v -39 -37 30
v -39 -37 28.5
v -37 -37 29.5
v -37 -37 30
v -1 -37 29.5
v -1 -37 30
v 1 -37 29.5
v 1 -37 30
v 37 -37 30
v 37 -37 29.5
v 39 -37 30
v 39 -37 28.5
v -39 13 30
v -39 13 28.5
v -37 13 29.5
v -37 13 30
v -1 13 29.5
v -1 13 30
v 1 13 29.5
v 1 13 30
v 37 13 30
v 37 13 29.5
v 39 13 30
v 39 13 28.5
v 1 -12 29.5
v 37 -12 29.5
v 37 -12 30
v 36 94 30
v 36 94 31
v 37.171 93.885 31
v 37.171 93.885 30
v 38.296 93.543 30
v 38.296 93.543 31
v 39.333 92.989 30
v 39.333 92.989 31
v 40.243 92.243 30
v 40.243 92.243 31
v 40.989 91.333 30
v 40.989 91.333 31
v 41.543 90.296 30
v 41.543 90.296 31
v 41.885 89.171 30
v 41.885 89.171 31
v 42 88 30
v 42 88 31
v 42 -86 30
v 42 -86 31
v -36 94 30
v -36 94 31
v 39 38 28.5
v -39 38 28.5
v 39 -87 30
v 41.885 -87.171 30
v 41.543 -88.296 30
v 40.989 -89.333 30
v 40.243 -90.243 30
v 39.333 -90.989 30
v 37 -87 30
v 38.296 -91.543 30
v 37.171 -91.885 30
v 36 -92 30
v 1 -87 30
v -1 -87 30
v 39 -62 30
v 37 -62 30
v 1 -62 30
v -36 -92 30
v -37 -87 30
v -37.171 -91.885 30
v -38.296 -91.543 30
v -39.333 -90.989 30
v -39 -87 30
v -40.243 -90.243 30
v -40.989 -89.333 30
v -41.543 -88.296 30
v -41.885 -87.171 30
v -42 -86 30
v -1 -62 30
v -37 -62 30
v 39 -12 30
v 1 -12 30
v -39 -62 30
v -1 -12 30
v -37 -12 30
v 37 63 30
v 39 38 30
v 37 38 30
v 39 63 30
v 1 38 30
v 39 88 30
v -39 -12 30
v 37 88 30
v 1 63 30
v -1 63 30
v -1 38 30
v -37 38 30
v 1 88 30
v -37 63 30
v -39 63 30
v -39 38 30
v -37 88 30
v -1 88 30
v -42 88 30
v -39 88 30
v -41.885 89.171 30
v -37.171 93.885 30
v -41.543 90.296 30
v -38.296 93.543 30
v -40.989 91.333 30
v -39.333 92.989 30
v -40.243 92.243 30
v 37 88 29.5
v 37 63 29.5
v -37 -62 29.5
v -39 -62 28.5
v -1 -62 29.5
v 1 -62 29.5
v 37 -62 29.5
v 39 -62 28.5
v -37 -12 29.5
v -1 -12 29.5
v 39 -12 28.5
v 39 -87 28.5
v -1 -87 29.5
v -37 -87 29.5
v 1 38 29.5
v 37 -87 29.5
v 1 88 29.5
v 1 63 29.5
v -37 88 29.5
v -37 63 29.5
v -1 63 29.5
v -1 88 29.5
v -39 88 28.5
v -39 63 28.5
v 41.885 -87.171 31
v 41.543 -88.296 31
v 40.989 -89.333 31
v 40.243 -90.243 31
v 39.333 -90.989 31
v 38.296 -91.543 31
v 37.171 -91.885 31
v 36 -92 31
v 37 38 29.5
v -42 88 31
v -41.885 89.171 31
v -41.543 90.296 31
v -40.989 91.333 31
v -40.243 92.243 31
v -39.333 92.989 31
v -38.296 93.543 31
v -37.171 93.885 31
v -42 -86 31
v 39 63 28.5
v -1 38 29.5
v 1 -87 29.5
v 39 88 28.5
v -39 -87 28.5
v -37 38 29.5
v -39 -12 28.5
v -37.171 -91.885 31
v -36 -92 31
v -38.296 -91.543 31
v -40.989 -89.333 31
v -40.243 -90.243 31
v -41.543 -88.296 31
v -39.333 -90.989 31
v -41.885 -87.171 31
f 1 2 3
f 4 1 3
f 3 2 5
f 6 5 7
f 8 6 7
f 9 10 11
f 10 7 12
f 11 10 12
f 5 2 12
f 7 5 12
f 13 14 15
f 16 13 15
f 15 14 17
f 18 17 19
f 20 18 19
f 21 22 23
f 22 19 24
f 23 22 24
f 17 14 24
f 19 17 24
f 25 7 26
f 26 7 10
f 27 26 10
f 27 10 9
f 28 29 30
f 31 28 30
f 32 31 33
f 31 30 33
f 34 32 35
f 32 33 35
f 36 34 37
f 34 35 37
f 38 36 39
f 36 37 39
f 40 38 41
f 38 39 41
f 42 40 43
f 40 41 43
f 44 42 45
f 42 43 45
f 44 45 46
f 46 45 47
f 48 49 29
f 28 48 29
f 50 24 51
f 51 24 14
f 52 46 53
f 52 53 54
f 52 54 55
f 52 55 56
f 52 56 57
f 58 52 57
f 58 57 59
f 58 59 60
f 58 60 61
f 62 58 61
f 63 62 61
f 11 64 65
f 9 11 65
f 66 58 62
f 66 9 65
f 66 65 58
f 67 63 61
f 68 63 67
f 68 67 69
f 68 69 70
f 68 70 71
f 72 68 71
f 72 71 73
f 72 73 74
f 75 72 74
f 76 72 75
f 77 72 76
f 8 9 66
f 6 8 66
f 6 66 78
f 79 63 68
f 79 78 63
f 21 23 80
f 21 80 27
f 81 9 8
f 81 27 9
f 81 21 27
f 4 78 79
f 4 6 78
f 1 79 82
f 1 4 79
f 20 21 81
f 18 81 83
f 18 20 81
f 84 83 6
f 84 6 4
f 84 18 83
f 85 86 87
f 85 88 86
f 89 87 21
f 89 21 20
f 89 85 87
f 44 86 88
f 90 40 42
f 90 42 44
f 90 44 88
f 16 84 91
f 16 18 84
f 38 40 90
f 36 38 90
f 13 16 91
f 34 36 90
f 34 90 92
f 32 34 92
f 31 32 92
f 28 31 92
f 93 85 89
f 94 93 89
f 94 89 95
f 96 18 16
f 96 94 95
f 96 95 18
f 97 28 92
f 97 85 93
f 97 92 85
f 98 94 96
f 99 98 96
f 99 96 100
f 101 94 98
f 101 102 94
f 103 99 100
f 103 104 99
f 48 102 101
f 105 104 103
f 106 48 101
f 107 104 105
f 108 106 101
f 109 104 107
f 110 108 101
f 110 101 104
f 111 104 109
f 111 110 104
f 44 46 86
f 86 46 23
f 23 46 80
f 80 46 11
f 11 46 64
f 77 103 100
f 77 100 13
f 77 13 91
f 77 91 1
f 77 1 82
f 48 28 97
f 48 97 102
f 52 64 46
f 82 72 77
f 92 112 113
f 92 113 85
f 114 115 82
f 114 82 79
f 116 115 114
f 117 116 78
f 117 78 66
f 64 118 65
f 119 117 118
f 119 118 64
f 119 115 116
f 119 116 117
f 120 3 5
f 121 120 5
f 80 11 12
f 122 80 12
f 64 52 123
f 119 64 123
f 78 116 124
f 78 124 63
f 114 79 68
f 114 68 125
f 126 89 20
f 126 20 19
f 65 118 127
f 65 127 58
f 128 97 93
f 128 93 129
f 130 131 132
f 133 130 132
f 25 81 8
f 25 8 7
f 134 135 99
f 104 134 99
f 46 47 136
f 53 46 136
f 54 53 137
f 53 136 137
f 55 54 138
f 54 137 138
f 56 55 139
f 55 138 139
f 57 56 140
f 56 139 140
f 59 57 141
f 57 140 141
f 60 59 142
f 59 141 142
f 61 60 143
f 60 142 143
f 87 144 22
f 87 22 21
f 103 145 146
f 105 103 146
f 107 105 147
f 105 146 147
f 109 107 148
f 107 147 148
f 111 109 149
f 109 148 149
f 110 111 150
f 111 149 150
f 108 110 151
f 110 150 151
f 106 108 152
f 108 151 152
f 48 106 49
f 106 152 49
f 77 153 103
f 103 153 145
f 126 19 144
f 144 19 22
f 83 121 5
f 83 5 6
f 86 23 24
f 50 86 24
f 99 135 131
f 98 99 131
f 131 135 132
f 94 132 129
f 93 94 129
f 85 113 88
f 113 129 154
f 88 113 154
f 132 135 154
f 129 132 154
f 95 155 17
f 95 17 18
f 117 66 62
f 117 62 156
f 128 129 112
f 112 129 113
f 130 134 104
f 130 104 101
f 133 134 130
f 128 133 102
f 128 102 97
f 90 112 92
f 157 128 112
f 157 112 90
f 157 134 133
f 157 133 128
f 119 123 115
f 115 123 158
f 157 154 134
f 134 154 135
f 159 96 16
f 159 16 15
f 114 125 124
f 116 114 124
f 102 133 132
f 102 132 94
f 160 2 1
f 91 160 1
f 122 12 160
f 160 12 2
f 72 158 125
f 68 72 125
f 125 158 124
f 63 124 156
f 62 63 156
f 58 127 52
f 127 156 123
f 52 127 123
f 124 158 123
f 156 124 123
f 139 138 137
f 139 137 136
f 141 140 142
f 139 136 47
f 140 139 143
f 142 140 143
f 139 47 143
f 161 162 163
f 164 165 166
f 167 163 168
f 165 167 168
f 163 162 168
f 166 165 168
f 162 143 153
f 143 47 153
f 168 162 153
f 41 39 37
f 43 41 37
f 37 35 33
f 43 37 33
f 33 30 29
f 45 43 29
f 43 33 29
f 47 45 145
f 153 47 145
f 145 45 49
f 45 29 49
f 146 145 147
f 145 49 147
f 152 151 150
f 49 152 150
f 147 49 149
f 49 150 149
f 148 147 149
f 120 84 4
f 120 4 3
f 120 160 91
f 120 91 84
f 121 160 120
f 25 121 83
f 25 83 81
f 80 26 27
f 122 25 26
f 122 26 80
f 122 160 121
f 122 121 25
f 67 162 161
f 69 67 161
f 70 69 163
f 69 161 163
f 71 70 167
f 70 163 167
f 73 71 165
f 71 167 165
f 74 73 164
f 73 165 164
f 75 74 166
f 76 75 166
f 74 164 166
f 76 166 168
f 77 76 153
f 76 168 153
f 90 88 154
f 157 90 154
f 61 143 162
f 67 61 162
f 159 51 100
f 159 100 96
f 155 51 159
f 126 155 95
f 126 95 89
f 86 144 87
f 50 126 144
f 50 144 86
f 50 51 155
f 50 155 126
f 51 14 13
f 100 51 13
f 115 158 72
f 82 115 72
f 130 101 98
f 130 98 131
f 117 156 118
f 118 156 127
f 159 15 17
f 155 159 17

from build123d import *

# Parameters (mm, degrees)
PAD044_DEPTH            = 1
PAD043_DEPTH            = 25
LINEARPATTERN_COUNT     = 4
LINEARPATTERN_PITCH     = 50
BODY028_PLACEMENT_ANGLE = 180


with BuildPart() as part:
    # Sketch114 → Pad044 (new body)
    with BuildSketch(Plane.XY):
        with BuildLine():
            Line((-42, 147), (-42, -27))
            ThreePointArc((-42, -27), (-40.242641, -31.242641), (-36, -33))
            Line((-36, -33), (36, -33))
            ThreePointArc((36, -33), (40.242641, -31.242641), (42, -27))
            Line((42, -27), (42, 147))
            ThreePointArc((42, 147), (40.242641, 151.242641), (36, 153))
            Line((36, 153), (-36, 153))
            ThreePointArc((-36, 153), (-40.242641, 151.242641), (-42, 147))
        make_face()
    extrude(amount=PAD044_DEPTH)

    # Sketch113 → Pad043 (join)
    with BuildSketch(Plane.XZ.offset(28)):
        Polygon((-39, 2.5), (39, 2.5), (39, 0), (38, 0), (37, 0), (37, 1.5), (1, 1.5), (1, 0), (0, 0), (-1, 0), (-1, 1.5), (-37, 1.5), (-37, 0), (-38, 0), (-39, 0), align=None)
    pad043 = extrude(amount=-PAD043_DEPTH)

    # LinearPattern: Pad043 ×4
    with Locations(*[(0, i * LINEARPATTERN_PITCH, 0) for i in range(1, LINEARPATTERN_COUNT)]):
        add(pad043)


with BuildPart() as part_1:
    # Body028 placement: moved
    add(part.part.moved(Location((0, -59, 31))).rotate(Axis((0, -59, 31), (0, 1, 0)), BODY028_PLACEMENT_ANGLE))


solid = part_1.part
